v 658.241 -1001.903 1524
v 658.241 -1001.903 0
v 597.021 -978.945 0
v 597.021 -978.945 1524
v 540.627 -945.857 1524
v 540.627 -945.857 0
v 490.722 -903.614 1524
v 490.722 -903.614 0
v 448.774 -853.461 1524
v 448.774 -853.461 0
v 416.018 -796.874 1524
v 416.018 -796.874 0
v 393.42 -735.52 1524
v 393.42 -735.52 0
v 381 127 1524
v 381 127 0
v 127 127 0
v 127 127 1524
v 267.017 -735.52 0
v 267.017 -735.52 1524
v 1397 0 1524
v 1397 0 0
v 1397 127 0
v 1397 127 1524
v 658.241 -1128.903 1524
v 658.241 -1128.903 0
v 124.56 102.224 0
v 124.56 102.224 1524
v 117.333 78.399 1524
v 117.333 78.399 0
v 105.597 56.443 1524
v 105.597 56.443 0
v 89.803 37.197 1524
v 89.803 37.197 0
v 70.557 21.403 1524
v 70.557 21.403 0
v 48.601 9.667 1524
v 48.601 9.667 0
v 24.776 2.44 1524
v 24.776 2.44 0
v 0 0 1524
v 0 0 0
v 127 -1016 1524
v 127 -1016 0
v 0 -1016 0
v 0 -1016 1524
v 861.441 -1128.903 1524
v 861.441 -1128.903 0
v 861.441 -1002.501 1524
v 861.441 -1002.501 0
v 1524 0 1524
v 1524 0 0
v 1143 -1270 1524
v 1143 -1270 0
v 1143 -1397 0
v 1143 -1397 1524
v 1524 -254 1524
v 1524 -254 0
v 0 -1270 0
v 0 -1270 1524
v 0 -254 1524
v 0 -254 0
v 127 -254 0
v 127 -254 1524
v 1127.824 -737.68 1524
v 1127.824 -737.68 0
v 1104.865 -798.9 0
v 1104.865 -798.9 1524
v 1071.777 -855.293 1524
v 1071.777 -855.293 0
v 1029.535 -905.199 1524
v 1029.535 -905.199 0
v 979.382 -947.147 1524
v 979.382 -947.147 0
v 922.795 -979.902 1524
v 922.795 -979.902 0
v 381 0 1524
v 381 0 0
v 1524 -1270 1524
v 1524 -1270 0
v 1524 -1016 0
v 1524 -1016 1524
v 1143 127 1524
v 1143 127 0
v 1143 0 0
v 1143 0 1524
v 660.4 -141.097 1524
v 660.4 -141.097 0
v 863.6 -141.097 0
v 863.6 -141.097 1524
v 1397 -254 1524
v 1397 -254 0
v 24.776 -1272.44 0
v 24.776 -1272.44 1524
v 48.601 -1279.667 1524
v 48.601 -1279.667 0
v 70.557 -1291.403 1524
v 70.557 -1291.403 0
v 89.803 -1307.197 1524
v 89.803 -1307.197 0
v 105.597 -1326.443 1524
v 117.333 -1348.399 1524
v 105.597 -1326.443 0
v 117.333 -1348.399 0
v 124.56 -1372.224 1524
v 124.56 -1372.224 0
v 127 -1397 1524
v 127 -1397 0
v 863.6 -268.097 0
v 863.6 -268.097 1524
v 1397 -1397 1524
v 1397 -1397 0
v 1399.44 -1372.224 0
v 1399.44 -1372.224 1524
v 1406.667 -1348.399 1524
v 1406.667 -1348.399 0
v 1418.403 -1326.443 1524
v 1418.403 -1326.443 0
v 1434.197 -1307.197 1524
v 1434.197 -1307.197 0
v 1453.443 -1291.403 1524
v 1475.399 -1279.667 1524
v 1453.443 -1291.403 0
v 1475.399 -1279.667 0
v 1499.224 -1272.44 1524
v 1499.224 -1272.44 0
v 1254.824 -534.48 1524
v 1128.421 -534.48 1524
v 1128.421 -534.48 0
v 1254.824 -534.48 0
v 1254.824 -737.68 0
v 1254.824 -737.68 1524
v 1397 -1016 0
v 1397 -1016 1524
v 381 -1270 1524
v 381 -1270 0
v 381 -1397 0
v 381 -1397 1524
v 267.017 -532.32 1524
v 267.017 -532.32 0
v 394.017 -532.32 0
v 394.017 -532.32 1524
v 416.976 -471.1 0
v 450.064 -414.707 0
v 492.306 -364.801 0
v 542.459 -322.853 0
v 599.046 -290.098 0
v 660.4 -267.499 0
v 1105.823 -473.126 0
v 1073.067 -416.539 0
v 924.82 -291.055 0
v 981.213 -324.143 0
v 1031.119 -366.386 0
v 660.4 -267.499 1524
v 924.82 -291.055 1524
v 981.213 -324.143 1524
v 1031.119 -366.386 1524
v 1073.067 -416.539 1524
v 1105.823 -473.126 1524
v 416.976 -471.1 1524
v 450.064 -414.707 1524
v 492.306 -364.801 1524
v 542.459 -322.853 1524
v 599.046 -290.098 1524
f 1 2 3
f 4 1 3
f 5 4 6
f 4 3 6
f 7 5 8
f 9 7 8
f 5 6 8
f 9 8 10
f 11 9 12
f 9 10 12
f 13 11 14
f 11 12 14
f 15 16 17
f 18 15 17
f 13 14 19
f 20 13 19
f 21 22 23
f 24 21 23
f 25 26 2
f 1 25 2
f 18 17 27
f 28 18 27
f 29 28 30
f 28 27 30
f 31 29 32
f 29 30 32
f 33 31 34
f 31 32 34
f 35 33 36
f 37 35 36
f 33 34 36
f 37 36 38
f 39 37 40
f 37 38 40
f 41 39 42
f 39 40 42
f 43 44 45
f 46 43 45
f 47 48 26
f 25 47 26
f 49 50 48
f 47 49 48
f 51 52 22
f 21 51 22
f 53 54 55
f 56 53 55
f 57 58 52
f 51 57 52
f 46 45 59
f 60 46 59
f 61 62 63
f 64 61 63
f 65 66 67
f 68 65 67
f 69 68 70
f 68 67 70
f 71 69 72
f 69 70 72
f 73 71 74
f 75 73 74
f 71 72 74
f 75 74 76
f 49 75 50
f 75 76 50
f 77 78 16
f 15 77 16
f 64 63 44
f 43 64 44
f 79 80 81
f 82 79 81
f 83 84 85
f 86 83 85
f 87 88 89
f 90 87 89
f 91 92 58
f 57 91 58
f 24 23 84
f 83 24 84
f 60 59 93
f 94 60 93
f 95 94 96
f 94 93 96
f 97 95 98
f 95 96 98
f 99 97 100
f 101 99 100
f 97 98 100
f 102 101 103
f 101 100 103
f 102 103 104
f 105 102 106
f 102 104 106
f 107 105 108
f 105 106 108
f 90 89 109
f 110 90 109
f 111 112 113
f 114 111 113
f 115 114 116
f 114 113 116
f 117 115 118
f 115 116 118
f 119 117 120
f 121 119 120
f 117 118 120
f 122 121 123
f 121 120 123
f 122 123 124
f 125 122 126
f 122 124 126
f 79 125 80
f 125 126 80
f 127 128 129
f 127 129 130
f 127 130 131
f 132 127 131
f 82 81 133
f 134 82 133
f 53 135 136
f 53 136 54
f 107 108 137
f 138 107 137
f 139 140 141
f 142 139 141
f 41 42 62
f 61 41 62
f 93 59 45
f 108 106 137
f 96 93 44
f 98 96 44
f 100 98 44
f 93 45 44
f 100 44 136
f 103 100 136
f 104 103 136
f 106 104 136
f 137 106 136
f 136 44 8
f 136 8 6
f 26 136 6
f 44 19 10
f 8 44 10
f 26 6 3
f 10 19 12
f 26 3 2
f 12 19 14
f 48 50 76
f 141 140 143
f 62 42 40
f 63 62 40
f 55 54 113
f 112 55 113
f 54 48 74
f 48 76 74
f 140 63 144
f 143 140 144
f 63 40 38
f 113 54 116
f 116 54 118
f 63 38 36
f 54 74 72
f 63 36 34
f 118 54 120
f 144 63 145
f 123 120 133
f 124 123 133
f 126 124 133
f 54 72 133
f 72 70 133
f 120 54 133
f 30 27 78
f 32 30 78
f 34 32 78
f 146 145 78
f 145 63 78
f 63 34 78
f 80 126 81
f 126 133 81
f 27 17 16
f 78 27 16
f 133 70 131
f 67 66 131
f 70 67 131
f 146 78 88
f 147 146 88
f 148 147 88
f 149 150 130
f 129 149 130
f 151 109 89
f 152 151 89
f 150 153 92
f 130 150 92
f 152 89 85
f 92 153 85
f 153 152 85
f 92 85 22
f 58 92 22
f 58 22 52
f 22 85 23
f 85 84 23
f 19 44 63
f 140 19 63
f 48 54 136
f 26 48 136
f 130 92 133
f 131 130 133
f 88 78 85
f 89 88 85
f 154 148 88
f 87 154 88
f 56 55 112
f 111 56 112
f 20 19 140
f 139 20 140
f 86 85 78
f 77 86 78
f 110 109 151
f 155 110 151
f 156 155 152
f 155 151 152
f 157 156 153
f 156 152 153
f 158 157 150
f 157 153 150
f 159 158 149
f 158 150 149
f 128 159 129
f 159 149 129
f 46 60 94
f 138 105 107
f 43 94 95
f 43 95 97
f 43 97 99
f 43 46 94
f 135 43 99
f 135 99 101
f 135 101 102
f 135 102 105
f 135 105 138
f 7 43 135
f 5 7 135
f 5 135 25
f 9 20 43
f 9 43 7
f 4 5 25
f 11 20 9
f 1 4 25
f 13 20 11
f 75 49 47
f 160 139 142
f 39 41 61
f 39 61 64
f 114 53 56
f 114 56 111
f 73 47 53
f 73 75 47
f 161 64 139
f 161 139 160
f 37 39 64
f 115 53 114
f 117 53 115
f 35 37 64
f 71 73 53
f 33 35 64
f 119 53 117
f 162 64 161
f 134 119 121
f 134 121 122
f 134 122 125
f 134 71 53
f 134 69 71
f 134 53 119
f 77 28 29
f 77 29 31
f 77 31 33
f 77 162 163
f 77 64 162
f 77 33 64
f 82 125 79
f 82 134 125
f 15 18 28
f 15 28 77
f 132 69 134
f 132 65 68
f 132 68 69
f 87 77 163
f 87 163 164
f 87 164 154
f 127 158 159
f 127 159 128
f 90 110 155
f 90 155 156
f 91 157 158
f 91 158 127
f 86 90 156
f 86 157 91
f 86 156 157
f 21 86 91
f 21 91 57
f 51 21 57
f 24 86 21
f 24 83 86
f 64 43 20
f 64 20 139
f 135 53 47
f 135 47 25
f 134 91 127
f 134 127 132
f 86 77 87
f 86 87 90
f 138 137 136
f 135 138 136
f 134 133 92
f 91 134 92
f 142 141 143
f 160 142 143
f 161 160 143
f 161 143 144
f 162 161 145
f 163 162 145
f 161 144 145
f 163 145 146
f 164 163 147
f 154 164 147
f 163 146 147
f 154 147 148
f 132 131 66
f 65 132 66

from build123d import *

# Parameters (mm, degrees)
F1_DEPTH = 1524


with BuildPart() as f1:
    # F0 (on Top) → F1 (new body)
    with BuildSketch(Plane.XY):
        with BuildLine():
            ThreePointArc((127, 127), (89.802561, 37.197439), (0, 0))
            Line((0, 0), (0, -254))
            Line((0, -254), (127, -254))
            Line((127, -254), (127, -635))
            Line((127, -635), (127, -1016))
            Line((127, -1016), (0, -1016))
            Line((0, -1016), (0, -1270))
            ThreePointArc((0, -1270), (89.802561, -1307.197439), (127, -1397))
            Line((127, -1397), (381, -1397))
            Line((381, -1397), (381, -1270))
            Line((381, -1270), (1143, -1270))
            Line((1143, -1270), (1143, -1397))
            Line((1143, -1397), (1397, -1397))
            ThreePointArc((1397, -1397), (1434.197439, -1307.197439), (1524, -1270))
            Line((1524, -1270), (1524, -1016))
            Line((1524, -1016), (1397, -1016))
            Line((1397, -1016), (1397, -635))
            Line((1397, -635), (1397, -254))
            Line((1397, -254), (1524, -254))
            Line((1524, -254), (1524, 0))
            Line((1524, 0), (1397, 0))
            Line((1397, 0), (1397, 127))
            Line((1397, 127), (1143, 127))
            Line((1143, 127), (1143, 0))
            Line((1143, 0), (381, 0))
            Line((381, 0), (381, 127))
            Line((381, 127), (127, 127))
        make_face()
        with BuildLine():
            Line((267.017298, -735.520426), (267.017298, -635))
            Line((267.017298, -635), (267.017298, -532.320426))
            Line((267.017298, -532.320426), (394.017298, -532.320426))
            ThreePointArc((394.017298, -532.320426), (492.305962, -364.801425), (660.4, -267.499464))
            Line((660.4, -267.499464), (660.4, -141.096872))
            Line((660.4, -141.096872), (762, -141.096872))
            Line((762, -141.096872), (863.6, -141.096872))
            Line((863.6, -141.096872), (863.6, -268.096872))
            ThreePointArc((863.6, -268.096872), (1031.119001, -366.385537), (1128.420962, -534.479574))
            Line((1128.420962, -534.479574), (1254.823553, -534.479574))
            Line((1254.823553, -534.479574), (1254.823553, -737.679574))
            Line((1254.823553, -737.679574), (1127.823553, -737.679574))
            ThreePointArc((1127.823553, -737.679574), (1029.534889, -905.198575), (861.440851, -1002.500536))
            Line((861.440851, -1002.500536), (861.440851, -1128.903128))
            Line((861.440851, -1128.903128), (658.240851, -1128.903128))
            Line((658.240851, -1128.903128), (658.240851, -1001.903128))
            ThreePointArc((658.240851, -1001.903128), (490.72185, -903.614463), (393.41989, -735.520426))
            Line((393.41989, -735.520426), (267.017298, -735.520426))
        make_face(mode=Mode.SUBTRACT)
    extrude(amount=F1_DEPTH)


solid = f1.part
